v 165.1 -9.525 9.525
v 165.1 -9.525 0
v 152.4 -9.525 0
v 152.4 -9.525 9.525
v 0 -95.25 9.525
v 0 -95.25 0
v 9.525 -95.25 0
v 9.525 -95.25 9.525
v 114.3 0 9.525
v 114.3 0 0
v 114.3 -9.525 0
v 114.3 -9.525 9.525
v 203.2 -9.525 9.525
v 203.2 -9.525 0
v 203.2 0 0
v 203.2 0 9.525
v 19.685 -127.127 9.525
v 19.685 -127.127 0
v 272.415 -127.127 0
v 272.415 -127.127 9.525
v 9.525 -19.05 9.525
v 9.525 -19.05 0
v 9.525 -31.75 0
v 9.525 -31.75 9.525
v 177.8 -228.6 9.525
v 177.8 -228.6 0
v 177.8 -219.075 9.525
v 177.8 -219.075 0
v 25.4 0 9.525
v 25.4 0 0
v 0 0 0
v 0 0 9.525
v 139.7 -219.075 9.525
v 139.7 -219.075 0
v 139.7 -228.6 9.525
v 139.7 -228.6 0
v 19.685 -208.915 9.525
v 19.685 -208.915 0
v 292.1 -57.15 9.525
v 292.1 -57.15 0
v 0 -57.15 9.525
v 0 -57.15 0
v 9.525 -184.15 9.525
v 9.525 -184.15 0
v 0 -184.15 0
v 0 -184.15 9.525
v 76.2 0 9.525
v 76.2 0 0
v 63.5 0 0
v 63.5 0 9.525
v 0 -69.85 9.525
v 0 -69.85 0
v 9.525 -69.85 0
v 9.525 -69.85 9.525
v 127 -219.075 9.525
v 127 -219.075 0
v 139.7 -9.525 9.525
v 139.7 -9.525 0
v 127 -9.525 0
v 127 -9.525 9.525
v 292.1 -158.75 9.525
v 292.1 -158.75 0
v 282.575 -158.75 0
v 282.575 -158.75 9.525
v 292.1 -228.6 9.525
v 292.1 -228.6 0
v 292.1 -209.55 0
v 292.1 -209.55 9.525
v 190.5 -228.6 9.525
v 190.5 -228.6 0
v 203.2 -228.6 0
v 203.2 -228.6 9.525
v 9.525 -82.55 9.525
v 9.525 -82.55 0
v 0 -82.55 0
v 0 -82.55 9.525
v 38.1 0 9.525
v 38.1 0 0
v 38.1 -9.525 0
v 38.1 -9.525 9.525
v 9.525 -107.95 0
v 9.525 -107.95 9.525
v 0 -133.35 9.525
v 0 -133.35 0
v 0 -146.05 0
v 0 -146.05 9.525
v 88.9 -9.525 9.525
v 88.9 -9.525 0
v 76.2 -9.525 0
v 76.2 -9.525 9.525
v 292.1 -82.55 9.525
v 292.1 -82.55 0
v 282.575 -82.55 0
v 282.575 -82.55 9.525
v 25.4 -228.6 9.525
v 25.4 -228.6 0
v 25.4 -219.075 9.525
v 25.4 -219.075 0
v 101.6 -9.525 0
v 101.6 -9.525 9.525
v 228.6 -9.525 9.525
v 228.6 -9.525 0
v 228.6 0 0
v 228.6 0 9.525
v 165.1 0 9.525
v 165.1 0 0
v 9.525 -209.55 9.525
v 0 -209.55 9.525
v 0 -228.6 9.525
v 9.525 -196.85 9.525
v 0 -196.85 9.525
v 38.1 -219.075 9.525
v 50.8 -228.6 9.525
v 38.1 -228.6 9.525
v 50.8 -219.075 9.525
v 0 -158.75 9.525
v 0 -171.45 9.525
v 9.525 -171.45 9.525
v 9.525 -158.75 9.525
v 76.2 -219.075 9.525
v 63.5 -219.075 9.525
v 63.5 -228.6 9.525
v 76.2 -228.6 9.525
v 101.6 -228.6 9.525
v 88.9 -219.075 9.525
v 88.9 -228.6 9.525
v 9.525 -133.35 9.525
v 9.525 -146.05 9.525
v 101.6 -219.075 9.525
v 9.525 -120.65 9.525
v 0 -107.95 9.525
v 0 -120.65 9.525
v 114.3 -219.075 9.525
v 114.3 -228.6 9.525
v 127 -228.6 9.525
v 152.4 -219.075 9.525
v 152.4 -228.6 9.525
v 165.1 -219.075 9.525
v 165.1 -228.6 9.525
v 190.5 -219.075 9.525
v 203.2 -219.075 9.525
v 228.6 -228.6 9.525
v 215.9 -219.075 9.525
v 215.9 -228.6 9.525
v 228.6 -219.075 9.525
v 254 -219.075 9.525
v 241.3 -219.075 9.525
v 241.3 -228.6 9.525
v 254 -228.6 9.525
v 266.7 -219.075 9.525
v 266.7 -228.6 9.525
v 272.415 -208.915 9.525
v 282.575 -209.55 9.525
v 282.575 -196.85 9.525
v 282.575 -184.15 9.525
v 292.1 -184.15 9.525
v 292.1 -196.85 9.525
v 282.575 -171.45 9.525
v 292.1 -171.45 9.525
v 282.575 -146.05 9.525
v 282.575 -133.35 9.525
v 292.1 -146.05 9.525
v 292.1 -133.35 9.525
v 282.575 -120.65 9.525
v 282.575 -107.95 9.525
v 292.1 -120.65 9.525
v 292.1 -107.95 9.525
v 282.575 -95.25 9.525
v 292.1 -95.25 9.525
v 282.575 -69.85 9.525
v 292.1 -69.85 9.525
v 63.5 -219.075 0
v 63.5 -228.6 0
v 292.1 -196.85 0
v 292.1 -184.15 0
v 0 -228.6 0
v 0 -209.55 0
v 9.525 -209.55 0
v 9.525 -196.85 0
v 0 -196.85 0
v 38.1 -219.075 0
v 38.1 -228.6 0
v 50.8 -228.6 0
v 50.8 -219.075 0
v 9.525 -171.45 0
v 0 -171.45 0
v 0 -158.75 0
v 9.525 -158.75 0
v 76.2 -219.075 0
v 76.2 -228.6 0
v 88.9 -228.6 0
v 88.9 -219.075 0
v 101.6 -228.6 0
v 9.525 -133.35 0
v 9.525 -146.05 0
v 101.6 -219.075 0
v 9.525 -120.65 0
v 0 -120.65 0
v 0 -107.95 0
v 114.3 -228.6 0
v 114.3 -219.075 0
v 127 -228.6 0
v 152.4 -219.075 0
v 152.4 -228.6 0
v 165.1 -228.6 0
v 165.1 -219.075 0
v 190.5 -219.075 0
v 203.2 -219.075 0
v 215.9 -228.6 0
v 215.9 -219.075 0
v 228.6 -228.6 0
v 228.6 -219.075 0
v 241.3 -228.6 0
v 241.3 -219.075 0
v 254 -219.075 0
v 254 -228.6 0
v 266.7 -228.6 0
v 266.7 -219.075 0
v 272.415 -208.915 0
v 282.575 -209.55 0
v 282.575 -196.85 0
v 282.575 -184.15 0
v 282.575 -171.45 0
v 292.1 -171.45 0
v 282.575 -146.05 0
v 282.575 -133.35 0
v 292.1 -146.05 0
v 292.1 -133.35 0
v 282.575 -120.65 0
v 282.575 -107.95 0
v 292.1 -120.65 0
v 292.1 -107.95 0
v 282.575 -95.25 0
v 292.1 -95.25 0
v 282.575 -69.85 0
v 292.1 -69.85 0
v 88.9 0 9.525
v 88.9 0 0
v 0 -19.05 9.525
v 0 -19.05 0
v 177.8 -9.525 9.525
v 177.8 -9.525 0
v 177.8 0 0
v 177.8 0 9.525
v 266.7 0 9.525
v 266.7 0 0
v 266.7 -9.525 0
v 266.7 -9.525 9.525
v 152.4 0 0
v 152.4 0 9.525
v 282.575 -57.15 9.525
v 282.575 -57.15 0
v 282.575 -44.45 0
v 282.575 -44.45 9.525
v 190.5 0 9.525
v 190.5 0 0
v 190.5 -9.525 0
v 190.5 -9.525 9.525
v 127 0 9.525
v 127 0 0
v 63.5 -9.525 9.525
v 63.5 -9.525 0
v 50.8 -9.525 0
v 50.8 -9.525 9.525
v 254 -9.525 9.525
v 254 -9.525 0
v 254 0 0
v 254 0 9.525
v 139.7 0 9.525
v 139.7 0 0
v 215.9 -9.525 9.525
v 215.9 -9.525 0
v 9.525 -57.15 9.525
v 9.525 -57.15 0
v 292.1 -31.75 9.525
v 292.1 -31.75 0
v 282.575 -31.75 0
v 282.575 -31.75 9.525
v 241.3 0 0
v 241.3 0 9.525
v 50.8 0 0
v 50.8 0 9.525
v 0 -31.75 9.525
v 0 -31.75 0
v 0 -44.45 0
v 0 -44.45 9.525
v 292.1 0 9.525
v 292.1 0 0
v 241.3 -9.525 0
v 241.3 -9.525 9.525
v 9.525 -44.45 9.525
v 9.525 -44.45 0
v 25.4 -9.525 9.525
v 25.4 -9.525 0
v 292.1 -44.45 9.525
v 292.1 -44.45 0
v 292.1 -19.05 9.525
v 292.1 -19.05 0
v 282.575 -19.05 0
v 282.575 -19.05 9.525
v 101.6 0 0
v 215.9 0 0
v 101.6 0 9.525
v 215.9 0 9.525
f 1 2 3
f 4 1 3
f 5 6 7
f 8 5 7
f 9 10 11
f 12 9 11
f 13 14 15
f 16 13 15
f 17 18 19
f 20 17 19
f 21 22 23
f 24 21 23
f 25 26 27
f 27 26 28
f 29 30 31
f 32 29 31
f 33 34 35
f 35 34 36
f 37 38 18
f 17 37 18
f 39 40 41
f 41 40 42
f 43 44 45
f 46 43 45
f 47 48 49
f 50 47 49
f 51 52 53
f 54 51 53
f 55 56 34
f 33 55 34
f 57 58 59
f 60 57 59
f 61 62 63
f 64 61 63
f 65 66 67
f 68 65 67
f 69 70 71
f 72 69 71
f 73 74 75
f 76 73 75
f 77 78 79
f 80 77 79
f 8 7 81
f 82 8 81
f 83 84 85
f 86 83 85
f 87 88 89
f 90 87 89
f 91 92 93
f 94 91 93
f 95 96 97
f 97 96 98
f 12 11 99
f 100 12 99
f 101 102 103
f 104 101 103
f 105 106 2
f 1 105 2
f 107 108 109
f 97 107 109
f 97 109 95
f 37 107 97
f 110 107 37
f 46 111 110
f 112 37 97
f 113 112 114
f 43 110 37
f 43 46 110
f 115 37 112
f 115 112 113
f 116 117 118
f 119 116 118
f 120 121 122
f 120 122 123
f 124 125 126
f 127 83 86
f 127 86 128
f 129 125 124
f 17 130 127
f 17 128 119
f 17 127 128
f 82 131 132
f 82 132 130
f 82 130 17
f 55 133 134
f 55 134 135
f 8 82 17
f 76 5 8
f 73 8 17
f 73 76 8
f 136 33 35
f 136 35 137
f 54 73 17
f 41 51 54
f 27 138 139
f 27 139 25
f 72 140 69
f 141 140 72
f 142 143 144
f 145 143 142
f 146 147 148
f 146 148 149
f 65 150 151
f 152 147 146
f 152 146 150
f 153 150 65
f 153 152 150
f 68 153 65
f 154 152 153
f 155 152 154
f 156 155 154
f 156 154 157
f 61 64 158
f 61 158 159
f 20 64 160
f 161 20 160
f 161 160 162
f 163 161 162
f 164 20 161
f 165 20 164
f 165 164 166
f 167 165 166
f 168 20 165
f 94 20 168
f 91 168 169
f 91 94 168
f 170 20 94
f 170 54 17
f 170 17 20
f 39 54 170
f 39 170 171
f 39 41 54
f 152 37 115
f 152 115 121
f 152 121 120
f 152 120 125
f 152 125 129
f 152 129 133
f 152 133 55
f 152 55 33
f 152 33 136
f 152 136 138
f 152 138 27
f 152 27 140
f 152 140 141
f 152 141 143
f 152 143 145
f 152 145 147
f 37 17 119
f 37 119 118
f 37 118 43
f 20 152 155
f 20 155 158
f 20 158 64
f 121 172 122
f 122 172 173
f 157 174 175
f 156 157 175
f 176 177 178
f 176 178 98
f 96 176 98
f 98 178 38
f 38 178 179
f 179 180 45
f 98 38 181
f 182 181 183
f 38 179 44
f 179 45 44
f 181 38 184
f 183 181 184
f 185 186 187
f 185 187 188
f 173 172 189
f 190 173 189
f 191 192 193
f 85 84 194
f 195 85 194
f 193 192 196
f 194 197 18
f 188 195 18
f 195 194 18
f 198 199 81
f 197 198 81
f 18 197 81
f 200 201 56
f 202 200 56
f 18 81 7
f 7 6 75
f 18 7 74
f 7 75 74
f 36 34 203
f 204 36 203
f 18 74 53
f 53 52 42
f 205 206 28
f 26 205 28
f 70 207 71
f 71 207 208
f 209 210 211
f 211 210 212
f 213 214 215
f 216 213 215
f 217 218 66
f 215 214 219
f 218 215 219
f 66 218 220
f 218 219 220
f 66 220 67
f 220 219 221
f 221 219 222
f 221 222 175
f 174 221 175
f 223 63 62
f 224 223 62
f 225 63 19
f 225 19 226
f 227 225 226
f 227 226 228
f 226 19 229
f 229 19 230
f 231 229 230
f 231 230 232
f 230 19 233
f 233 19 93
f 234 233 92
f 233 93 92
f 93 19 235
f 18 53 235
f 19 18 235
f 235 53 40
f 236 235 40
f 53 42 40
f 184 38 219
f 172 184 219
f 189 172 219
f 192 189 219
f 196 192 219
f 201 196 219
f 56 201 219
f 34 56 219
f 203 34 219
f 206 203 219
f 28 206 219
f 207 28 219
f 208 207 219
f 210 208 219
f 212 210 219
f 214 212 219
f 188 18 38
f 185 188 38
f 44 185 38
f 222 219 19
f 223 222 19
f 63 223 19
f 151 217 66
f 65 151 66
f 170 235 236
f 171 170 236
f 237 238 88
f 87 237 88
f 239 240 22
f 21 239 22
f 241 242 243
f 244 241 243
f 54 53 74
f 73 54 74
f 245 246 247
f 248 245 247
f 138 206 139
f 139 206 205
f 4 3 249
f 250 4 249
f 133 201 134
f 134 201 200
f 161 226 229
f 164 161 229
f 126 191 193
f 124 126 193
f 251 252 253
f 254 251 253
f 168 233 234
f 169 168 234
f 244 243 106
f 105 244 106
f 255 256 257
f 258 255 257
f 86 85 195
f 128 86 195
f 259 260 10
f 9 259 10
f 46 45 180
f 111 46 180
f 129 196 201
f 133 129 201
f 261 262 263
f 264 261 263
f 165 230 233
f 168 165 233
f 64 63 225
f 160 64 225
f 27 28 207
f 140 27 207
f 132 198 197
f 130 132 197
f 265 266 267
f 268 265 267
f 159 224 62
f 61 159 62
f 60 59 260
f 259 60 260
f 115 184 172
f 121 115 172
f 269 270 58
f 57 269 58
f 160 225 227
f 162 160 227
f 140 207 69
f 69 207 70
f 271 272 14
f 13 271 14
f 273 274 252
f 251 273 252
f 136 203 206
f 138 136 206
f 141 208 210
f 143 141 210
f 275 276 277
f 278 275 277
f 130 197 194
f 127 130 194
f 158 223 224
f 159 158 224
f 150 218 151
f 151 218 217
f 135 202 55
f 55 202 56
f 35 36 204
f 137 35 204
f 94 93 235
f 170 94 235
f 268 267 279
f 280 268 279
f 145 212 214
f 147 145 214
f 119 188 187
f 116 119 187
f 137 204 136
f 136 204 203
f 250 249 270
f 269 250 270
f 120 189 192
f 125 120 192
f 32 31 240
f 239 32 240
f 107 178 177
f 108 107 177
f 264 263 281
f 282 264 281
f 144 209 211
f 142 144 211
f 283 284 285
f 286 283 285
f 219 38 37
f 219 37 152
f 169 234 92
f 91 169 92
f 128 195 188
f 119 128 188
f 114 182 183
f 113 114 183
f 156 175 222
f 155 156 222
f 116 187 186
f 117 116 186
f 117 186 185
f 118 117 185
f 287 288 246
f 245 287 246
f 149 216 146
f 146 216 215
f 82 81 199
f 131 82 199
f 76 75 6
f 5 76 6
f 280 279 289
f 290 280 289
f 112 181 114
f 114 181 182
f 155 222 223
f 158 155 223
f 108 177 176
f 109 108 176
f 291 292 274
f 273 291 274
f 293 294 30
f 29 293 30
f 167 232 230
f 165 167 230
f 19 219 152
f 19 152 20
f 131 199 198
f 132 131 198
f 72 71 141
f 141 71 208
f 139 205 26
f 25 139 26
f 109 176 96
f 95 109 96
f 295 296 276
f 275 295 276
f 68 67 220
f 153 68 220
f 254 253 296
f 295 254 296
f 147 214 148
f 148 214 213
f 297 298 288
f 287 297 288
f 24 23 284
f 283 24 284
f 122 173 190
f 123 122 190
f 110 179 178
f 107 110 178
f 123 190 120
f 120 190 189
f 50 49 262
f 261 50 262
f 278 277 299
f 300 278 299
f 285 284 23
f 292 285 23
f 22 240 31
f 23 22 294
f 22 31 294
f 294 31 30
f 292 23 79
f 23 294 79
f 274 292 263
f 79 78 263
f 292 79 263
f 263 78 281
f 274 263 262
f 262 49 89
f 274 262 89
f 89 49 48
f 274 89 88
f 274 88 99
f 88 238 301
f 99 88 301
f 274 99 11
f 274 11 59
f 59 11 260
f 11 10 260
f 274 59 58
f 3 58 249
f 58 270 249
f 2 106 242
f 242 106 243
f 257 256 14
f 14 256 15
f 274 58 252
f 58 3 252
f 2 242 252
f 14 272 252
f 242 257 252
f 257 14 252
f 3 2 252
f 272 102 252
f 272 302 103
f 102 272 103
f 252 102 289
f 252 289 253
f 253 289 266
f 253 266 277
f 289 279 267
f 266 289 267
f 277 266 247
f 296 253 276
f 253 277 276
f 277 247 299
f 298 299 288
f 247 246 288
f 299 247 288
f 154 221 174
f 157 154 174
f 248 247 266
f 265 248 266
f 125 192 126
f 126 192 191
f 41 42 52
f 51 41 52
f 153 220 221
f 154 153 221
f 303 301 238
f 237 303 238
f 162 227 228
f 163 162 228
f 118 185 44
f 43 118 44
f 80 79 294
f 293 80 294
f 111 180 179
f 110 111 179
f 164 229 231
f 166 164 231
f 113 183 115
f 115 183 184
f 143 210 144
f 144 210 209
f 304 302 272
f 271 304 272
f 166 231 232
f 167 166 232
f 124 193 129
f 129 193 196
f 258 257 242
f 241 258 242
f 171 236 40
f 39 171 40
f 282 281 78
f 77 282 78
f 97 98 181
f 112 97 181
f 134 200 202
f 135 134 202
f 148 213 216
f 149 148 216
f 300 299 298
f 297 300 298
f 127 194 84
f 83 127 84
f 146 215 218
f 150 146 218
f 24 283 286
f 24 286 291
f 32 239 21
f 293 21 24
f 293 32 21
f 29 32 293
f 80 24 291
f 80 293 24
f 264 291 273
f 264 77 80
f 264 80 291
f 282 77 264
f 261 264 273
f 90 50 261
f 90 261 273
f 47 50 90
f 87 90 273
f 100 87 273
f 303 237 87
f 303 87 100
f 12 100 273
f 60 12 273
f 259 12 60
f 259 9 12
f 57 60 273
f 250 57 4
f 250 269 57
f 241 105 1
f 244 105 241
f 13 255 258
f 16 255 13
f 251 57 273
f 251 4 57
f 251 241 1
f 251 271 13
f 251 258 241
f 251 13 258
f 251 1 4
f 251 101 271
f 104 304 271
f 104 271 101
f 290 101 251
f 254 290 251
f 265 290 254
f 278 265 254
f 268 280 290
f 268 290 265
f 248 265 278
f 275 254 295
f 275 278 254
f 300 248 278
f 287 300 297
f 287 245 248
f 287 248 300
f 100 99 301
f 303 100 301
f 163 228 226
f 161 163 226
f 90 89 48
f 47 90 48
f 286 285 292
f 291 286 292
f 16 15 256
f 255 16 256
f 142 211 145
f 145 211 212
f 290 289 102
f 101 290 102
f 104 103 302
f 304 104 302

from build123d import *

# Parameters (mm, degrees)
F1_DEPTH = 9.525
F0_W     = 252.73
F0_H     = 81.788
F2_DEPTH = 9.525


with BuildPart() as f1:
    # F0 (on Top) → F1 (new body)
    with BuildSketch(Plane.XY):
        Polygon((25.4, 0), (0, 0), (0, -19.05), (9.525, -19.05), (9.525, -31.75), (0, -31.75), (0, -44.45), (9.525, -44.45), (9.525, -57.15), (282.575, -57.15), (282.575, -44.45), (292.1, -44.45), (292.1, -31.75), (282.575, -31.75), (282.575, -19.05), (292.1, -19.05), (292.1, 0), (266.7, 0), (266.7, -9.525), (254, -9.525), (254, 0), (241.3, 0), (241.3, -9.525), (228.6, -9.525), (228.6, 0), (215.9, 0), (215.9, -9.525), (203.2, -9.525), (203.2, 0), (190.5, 0), (190.5, -9.525), (177.8, -9.525), (177.8, 0), (165.1, 0), (165.1, -9.525), (152.4, -9.525), (152.4, 0), (139.7, 0), (139.7, -9.525), (127, -9.525), (127, 0), (114.3, 0), (114.3, -9.525), (101.6, -9.525), (101.6, 0), (88.9, 0), (88.9, -9.525), (76.2, -9.525), (76.2, 0), (63.5, 0), (63.5, -9.525), (50.8, -9.525), (50.8, 0), (38.1, 0), (38.1, -9.525), (25.4, -9.525), align=None)
    extrude(amount=F1_DEPTH)


with BuildPart() as f2:
    # F0 (on Top) → F2 (new body)
    with BuildSketch(Plane.XY):
        Polygon((282.575, -57.15), (9.525, -57.15), (0, -57.15), (0, -69.85), (9.525, -69.85), (9.525, -82.55), (0, -82.55), (0, -95.25), (9.525, -95.25), (9.525, -107.95), (0, -107.95), (0, -120.65), (9.525, -120.65), (9.525, -133.35), (0, -133.35), (0, -146.05), (9.525, -146.05), (9.525, -158.75), (0, -158.75), (0, -171.45), (9.525, -171.45), (9.525, -184.15), (0, -184.15), (0, -196.85), (9.525, -196.85), (9.525, -209.55), (0, -209.55), (0, -228.6), (25.4, -228.6), (25.4, -219.075), (38.1, -219.075), (38.1, -228.6), (50.8, -228.6), (50.8, -219.075), (63.5, -219.075), (63.5, -228.6), (76.2, -228.6), (76.2, -219.075), (88.9, -219.075), (88.9, -228.6), (101.6, -228.6), (101.6, -219.075), (114.3, -219.075), (114.3, -228.6), (127, -228.6), (127, -219.075), (139.7, -219.075), (139.7, -228.6), (152.4, -228.6), (152.4, -219.075), (165.1, -219.075), (165.1, -228.6), (177.8, -228.6), (177.8, -219.075), (190.5, -219.075), (190.5, -228.6), (203.2, -228.6), (203.2, -219.075), (215.9, -219.075), (215.9, -228.6), (228.6, -228.6), (228.6, -219.075), (241.3, -219.075), (241.3, -228.6), (254, -228.6), (254, -219.075), (266.7, -219.075), (266.7, -228.6), (292.1, -228.6), (292.1, -209.55), (282.575, -209.55), (282.575, -196.85), (292.1, -196.85), (292.1, -184.15), (282.575, -184.15), (282.575, -171.45), (292.1, -171.45), (292.1, -158.75), (282.575, -158.75), (282.575, -146.05), (292.1, -146.05), (292.1, -133.35), (282.575, -133.35), (282.575, -120.65), (292.1, -120.65), (292.1, -107.95), (282.575, -107.95), (282.575, -95.25), (292.1, -95.25), (292.1, -82.55), (282.575, -82.55), (282.575, -69.85), (292.1, -69.85), (292.1, -57.15), align=None)
        with Locations((146.05, -168.021)):
            Rectangle(F0_W, F0_H, mode=Mode.SUBTRACT)
    extrude(amount=F2_DEPTH)


solid = Compound([f1.part, f2.part])
